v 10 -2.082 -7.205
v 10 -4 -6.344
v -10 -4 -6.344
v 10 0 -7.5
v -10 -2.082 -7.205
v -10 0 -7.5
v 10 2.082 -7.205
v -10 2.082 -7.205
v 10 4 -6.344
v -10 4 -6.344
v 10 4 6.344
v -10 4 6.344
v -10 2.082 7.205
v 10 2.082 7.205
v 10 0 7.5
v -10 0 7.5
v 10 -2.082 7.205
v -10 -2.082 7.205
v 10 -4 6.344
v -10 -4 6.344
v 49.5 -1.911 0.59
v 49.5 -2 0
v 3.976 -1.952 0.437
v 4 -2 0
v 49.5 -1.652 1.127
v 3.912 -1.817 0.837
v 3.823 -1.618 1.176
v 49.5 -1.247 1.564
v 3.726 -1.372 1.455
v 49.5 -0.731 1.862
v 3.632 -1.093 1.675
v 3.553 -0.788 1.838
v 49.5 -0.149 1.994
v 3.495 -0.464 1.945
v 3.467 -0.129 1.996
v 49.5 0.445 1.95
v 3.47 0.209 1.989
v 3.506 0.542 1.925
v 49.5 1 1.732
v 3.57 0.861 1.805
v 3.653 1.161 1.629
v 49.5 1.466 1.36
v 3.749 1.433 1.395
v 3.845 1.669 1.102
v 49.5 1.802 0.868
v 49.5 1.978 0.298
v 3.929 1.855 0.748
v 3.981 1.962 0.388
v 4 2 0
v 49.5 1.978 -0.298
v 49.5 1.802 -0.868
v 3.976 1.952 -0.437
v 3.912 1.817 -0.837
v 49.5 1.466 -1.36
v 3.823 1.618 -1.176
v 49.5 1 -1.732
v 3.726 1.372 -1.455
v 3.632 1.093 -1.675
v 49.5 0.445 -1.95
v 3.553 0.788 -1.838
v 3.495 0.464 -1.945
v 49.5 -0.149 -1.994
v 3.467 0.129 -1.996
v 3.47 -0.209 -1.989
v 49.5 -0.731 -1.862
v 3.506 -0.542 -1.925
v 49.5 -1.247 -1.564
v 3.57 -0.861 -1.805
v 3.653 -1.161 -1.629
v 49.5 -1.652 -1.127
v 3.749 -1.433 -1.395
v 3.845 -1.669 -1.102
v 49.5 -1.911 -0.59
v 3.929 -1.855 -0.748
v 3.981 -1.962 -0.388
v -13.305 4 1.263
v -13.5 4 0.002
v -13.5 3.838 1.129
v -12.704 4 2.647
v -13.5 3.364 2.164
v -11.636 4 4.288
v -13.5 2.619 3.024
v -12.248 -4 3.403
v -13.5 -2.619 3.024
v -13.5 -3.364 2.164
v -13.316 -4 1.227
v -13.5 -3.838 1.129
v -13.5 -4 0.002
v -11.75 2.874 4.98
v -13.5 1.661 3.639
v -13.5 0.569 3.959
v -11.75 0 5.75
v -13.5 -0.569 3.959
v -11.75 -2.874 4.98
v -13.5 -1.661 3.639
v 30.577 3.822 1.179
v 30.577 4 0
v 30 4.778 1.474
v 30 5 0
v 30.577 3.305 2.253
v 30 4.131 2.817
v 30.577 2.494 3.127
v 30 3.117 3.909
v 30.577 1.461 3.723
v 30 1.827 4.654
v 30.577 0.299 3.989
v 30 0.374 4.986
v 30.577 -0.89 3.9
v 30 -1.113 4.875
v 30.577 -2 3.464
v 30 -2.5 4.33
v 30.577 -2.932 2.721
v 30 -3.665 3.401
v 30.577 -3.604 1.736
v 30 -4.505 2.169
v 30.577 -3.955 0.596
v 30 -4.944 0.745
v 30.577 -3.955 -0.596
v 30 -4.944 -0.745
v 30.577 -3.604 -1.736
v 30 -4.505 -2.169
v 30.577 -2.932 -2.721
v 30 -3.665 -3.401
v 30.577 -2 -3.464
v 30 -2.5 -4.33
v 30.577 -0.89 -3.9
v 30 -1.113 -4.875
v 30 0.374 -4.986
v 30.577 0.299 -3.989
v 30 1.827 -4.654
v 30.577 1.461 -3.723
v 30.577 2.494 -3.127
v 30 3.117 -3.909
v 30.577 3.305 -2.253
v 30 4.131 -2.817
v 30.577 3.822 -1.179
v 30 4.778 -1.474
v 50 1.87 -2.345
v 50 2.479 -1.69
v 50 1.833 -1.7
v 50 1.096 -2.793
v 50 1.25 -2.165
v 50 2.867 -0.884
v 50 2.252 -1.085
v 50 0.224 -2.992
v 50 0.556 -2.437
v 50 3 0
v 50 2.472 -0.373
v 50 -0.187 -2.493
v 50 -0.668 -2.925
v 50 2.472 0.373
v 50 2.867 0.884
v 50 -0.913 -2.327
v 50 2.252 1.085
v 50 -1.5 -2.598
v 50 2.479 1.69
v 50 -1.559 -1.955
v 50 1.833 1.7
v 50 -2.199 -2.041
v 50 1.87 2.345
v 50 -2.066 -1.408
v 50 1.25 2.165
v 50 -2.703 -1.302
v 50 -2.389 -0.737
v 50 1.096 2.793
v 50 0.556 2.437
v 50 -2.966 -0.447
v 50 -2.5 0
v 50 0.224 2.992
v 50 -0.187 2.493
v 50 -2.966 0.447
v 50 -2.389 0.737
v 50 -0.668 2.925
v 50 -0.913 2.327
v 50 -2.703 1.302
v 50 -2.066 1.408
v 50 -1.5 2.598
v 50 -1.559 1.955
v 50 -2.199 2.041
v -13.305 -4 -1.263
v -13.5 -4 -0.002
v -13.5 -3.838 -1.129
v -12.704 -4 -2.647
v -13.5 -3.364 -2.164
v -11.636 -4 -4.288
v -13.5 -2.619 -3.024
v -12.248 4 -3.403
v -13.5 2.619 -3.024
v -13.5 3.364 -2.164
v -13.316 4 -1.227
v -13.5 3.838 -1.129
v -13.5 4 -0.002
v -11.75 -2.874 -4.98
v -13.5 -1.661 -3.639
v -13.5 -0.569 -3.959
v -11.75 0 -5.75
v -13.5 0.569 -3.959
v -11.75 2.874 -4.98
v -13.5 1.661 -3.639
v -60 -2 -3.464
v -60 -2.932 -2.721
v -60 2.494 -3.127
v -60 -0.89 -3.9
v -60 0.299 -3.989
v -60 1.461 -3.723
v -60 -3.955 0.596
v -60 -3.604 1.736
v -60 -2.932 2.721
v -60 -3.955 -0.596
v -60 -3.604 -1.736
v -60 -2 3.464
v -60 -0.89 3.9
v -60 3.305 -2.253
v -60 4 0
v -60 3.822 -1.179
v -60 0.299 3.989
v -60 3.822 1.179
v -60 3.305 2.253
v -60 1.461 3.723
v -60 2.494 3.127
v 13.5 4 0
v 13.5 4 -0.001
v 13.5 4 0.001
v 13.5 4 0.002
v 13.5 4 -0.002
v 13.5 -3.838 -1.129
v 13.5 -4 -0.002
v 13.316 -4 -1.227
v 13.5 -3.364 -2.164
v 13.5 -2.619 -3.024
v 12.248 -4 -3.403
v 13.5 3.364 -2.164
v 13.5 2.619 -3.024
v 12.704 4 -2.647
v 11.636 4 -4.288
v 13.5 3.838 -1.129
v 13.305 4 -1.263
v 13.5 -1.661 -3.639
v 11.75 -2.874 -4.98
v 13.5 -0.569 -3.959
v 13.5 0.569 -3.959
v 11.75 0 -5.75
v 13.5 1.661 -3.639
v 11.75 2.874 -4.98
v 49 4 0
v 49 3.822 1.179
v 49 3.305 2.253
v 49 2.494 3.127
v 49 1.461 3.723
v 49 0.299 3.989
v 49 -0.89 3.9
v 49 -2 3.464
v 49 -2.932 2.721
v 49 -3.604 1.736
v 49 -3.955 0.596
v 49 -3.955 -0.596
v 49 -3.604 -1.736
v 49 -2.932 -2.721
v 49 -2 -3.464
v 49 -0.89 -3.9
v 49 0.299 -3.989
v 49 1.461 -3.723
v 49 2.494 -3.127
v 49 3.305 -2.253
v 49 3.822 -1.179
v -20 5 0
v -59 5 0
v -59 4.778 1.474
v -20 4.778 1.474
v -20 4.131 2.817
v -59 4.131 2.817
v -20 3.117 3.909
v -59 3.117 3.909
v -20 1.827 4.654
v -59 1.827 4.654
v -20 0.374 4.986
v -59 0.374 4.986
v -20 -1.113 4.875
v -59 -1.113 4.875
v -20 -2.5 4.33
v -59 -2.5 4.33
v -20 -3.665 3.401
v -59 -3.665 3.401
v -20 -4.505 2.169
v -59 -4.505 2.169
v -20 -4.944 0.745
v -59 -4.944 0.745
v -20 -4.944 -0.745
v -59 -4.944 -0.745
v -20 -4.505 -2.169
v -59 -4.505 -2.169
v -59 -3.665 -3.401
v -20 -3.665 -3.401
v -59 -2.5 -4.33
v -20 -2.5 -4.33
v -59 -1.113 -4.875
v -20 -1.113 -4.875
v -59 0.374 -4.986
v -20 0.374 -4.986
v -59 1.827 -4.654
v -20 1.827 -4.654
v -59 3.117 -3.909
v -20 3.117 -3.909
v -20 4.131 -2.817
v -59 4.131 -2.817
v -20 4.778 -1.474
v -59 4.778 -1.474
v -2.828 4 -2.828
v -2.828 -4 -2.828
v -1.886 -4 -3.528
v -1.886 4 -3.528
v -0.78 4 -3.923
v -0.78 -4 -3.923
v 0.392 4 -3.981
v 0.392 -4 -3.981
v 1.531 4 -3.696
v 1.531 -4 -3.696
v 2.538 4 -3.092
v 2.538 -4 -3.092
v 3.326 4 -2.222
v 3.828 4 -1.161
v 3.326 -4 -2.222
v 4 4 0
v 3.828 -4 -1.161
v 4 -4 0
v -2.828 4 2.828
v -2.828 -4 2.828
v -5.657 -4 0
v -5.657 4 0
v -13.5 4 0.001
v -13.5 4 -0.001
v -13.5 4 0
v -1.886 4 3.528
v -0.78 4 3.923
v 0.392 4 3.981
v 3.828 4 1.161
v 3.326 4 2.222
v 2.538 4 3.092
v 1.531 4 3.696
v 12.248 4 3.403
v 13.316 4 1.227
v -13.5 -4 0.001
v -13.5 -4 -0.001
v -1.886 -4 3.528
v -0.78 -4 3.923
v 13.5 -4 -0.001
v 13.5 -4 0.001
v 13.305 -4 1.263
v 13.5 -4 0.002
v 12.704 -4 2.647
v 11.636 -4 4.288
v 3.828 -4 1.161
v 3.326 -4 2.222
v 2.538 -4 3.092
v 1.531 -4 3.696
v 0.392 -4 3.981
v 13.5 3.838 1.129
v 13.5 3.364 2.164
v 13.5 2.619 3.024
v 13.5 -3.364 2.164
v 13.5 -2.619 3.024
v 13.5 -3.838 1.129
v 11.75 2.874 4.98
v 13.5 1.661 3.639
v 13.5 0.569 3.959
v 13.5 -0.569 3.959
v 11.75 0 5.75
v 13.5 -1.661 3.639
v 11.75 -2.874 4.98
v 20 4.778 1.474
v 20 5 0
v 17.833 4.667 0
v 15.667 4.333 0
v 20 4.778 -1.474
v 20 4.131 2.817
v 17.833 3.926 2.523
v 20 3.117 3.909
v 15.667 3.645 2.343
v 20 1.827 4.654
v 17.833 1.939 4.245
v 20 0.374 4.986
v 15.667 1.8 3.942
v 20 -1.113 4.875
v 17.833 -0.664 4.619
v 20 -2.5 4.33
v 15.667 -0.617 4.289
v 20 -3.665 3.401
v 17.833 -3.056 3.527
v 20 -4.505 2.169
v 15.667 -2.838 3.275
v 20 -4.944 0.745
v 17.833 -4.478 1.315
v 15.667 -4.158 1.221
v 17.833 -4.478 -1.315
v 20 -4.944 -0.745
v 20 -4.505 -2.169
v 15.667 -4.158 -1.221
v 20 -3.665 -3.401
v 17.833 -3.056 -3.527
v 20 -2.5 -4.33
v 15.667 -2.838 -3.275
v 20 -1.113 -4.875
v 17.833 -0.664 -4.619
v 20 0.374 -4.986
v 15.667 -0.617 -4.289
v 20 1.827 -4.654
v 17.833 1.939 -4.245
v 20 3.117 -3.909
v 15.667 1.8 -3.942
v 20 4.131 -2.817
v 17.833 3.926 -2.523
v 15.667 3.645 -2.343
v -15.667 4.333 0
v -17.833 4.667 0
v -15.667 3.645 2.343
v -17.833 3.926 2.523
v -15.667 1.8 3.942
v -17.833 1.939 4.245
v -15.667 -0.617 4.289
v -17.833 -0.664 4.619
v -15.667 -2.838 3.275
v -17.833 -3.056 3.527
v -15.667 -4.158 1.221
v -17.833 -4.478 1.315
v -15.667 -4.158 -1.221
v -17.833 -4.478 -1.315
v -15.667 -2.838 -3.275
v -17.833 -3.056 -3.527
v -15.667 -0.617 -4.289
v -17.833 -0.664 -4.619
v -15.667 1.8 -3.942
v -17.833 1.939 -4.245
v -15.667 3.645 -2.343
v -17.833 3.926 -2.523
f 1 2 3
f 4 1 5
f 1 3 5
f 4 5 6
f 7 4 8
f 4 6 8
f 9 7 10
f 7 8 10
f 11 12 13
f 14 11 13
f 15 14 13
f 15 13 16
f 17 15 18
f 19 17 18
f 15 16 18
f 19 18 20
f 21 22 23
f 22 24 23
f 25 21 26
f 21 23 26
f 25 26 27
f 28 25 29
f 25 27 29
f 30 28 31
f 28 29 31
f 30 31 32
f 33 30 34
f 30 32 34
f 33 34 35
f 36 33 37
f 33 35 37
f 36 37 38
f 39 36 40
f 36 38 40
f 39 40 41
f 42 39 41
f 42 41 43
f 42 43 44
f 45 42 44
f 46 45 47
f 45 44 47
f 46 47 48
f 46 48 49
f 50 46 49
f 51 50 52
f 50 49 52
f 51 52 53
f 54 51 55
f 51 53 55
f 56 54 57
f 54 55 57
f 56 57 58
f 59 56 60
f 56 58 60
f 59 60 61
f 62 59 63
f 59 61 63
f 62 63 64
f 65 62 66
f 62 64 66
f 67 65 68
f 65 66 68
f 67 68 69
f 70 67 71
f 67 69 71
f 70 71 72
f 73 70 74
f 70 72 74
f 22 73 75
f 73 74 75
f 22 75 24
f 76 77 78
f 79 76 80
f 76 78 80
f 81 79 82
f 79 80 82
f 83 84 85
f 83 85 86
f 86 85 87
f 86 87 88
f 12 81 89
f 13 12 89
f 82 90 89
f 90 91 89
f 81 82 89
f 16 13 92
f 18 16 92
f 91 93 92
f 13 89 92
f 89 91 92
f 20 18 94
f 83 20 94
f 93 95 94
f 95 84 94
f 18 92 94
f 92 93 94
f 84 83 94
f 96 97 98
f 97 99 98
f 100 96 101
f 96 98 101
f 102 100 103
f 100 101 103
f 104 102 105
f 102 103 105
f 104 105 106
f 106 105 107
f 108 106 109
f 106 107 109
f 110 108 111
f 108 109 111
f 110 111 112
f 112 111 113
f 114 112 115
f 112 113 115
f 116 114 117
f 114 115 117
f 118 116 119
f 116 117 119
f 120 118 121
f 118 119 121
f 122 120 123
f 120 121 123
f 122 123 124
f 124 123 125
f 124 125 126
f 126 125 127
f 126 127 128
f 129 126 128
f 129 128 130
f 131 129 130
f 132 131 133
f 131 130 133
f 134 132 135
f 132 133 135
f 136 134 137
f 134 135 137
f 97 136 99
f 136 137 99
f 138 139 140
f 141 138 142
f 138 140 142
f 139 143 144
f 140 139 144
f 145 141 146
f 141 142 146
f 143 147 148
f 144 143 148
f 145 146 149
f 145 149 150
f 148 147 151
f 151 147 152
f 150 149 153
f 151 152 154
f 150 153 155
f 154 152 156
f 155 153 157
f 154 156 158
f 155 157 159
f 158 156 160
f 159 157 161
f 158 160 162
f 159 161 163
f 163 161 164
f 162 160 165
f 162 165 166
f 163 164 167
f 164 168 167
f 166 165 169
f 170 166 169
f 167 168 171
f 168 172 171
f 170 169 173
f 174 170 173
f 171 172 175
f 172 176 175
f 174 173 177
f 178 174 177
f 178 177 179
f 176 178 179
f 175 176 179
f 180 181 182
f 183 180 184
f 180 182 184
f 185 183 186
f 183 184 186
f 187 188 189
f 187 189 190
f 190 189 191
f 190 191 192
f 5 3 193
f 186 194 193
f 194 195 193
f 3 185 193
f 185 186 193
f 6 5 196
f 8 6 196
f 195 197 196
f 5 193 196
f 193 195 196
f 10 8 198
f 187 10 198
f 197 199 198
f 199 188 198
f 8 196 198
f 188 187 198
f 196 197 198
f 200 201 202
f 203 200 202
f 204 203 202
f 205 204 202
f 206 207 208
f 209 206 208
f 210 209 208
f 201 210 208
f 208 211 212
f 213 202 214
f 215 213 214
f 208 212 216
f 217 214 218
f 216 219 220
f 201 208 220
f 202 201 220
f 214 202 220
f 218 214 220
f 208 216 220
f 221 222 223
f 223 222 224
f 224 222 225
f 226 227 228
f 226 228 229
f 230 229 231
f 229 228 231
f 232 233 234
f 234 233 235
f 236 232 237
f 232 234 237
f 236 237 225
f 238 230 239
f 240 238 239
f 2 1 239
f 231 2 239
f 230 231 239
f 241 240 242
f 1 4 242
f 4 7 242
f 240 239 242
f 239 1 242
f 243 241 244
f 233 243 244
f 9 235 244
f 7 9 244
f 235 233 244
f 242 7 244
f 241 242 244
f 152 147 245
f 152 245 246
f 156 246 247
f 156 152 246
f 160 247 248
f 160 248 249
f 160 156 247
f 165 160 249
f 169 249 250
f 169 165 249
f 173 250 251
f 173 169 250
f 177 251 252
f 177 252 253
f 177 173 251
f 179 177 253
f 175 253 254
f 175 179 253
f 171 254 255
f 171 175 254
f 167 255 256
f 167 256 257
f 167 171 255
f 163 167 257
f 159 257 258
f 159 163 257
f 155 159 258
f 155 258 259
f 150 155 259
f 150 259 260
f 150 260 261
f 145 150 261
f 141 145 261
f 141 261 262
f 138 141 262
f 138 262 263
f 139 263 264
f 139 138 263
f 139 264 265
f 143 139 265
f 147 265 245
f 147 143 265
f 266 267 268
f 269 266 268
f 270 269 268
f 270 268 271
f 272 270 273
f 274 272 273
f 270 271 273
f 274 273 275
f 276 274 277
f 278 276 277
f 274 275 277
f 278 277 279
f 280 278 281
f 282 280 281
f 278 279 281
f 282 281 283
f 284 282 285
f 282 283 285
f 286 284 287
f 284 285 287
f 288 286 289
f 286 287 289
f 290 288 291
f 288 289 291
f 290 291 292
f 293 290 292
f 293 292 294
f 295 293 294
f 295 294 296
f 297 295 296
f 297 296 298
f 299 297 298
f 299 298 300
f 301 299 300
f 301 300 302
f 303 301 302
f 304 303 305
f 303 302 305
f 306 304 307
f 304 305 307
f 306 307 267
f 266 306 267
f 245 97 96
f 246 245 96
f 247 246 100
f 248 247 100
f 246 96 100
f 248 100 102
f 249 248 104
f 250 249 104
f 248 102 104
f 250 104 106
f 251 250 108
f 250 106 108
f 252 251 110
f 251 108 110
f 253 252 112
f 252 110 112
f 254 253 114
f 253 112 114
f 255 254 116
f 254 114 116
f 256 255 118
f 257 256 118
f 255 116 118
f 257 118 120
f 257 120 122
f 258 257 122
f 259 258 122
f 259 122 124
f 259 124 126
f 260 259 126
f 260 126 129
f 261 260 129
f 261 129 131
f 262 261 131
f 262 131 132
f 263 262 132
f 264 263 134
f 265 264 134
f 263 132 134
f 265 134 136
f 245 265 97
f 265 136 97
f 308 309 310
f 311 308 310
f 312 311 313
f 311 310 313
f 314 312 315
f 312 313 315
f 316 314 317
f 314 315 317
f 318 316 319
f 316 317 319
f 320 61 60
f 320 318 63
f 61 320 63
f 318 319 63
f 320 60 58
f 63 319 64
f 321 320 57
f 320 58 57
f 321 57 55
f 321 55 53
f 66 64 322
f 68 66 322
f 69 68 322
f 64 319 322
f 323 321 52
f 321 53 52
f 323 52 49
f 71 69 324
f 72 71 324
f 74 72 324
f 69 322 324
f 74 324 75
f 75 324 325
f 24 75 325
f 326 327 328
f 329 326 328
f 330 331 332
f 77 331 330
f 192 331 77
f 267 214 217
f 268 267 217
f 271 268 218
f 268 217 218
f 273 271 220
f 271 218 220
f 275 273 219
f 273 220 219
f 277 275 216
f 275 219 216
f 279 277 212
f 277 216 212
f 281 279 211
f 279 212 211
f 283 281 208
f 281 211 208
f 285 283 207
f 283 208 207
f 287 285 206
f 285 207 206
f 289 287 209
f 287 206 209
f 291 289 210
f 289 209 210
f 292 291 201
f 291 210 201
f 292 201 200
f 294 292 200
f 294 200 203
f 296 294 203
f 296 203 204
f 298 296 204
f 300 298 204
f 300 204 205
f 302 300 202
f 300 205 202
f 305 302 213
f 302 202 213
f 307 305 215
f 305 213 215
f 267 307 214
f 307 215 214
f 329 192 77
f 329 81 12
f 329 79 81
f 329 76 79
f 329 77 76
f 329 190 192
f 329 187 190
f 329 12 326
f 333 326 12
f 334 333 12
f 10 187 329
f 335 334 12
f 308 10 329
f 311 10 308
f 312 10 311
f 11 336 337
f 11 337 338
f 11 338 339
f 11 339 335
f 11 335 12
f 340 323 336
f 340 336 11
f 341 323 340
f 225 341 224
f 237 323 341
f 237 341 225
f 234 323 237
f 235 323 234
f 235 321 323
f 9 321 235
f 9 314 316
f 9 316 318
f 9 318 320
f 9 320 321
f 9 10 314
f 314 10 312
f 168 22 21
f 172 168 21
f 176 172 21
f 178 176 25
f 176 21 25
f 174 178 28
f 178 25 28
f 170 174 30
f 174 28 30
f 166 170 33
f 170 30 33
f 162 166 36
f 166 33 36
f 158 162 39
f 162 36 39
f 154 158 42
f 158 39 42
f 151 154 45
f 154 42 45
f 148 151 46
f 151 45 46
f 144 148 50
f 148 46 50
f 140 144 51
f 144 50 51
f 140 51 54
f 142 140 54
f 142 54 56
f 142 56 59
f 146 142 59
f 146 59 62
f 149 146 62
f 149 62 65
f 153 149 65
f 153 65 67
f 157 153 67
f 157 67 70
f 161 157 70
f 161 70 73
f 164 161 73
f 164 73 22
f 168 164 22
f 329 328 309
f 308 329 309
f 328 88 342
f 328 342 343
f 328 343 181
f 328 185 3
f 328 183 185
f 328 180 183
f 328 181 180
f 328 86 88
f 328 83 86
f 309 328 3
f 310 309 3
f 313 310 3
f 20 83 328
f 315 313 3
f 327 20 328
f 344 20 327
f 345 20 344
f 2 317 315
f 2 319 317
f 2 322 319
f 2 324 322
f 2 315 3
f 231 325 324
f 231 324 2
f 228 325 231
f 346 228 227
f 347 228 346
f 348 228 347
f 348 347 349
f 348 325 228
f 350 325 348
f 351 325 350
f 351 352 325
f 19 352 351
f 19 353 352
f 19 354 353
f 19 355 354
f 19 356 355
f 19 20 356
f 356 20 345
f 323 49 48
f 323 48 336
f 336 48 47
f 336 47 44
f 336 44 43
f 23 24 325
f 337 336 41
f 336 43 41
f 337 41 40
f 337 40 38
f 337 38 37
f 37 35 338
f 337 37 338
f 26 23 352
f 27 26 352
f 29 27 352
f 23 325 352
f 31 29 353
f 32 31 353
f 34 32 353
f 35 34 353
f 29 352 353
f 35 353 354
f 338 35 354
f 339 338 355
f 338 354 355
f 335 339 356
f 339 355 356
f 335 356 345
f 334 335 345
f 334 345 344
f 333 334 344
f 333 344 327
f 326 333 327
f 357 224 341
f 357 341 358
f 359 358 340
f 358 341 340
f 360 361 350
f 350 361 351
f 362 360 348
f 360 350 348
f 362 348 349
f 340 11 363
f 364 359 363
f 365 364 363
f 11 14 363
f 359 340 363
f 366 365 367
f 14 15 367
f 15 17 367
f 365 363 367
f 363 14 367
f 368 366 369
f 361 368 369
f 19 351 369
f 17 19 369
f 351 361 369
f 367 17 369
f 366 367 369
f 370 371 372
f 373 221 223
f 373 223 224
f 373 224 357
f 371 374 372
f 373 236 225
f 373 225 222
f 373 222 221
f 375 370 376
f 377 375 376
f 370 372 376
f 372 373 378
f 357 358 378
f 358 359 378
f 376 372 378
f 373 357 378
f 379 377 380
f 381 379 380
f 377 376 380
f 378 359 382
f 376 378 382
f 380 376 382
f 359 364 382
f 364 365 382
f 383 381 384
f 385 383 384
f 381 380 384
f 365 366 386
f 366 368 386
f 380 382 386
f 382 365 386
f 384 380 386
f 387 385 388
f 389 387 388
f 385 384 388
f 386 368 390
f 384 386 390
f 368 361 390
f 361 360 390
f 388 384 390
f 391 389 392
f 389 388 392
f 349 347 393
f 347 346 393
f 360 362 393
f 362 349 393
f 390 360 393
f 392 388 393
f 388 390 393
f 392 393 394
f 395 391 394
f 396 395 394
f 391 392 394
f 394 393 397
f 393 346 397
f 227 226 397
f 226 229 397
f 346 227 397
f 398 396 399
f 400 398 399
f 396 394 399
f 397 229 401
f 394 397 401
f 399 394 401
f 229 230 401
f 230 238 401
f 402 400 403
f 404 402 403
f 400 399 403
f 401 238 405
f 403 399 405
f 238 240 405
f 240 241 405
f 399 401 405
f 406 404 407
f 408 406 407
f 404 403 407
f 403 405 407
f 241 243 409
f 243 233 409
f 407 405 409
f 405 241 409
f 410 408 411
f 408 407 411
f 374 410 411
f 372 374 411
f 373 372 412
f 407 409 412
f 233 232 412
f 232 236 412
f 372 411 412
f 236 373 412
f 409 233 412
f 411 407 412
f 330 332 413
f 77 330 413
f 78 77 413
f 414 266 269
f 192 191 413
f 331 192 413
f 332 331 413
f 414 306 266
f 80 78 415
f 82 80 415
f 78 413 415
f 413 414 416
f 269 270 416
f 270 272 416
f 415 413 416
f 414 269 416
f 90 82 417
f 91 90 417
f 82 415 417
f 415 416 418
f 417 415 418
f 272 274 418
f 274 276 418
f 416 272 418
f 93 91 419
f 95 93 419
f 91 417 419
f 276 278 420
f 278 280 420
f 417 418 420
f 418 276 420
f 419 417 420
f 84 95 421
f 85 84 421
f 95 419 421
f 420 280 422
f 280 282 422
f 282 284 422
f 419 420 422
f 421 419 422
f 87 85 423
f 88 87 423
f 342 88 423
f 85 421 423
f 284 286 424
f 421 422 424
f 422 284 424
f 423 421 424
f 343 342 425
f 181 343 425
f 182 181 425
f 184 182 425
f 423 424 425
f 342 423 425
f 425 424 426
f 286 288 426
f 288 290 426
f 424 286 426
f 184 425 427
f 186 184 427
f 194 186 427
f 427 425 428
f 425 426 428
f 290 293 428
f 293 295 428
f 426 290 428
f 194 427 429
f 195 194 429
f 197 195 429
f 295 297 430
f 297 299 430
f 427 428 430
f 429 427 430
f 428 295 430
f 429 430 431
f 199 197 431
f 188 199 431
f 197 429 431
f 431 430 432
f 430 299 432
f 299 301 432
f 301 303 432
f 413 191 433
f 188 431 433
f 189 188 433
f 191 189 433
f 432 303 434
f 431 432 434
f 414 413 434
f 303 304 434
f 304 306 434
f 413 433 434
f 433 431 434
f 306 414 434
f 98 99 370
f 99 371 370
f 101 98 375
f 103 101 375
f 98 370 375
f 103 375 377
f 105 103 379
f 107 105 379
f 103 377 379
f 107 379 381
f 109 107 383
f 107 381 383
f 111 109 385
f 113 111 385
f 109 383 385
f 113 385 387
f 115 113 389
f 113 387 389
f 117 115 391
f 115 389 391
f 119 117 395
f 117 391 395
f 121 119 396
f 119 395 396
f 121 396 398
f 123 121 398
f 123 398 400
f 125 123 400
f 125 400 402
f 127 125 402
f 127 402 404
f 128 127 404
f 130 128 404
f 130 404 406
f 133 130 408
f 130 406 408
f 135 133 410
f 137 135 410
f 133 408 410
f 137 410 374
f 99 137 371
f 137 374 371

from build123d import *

# Parameters (mm, degrees)
F2_W           = 27
F2_H           = 10.543919
F3_DEPTH       = 12.5
F4_SIZE        = 1
F6_DEPTH       = 12.5
F8_D           = 4
F8_DEPTH       = 50
F8_CSINK_D     = 5
F8_CSINK_ANGLE = 90


with BuildPart() as f1:
    # F0 (on Top) → F1 (revolve)
    with BuildSketch(Plane.XY):
        Polygon((30.57735, 4), (30, 5), (20, 5), (13.5, 4), (10, 7.5), (0, 7.5), (-10, 7.5), (-13.5, 4), (-20, 5), (-60, 5), (-60, 0), (0, 0), (50, 0), (50, 4), align=None)
    revolve(axis=Axis((-30, 0, 0), (1, 0, 0)))

    # F2 (on Top) → F3 (cut, symmetric)
    with BuildSketch(Plane.XY):
        with Locations((0, 9.271959)):
            Rectangle(F2_W, F2_H)
        with Locations((0, -9.271959)):
            Rectangle(F2_W, F2_H)
    extrude(amount=F3_DEPTH, both=True, mode=Mode.SUBTRACT)

    # F4
    f4_edges = [f1.edges().sort_by_distance(p)[0] for p in [
        (-60, -5, 0),
        (50, -4, 0),
    ]]
    chamfer(f4_edges, length=F4_SIZE)

    # F5 (on face) → F6 (cut, symmetric)
    with BuildSketch(Plane.XZ.offset(4)):
        with BuildLine():
            ThreePointArc((-2.828427, -2.828427), (1.530734, -3.695518), (4, 0))
            ThreePointArc((4, 0), (1.530734, 3.695518), (-2.828427, 2.828427))
            ThreePointArc((-2.828427, 2.828427), (-4, 0), (-2.828427, -2.828427))
        make_face()
        with BuildLine():
            ThreePointArc((-2.828427, -2.828427), (-4, 0), (-2.828427, 2.828427))
            Line((-2.828427, 2.828427), (-5.656854, 0))
            Line((-5.656854, 0), (-2.828427, -2.828427))
        make_face()
    extrude(amount=F6_DEPTH, both=True, mode=Mode.SUBTRACT)

    # F8
    with Locations(Plane.YZ.offset(50)):
        with Locations((0, 0)):
            CounterSinkHole(F8_D / 2, F8_CSINK_D / 2, depth=F8_DEPTH, counter_sink_angle=F8_CSINK_ANGLE)


solid = f1.part
